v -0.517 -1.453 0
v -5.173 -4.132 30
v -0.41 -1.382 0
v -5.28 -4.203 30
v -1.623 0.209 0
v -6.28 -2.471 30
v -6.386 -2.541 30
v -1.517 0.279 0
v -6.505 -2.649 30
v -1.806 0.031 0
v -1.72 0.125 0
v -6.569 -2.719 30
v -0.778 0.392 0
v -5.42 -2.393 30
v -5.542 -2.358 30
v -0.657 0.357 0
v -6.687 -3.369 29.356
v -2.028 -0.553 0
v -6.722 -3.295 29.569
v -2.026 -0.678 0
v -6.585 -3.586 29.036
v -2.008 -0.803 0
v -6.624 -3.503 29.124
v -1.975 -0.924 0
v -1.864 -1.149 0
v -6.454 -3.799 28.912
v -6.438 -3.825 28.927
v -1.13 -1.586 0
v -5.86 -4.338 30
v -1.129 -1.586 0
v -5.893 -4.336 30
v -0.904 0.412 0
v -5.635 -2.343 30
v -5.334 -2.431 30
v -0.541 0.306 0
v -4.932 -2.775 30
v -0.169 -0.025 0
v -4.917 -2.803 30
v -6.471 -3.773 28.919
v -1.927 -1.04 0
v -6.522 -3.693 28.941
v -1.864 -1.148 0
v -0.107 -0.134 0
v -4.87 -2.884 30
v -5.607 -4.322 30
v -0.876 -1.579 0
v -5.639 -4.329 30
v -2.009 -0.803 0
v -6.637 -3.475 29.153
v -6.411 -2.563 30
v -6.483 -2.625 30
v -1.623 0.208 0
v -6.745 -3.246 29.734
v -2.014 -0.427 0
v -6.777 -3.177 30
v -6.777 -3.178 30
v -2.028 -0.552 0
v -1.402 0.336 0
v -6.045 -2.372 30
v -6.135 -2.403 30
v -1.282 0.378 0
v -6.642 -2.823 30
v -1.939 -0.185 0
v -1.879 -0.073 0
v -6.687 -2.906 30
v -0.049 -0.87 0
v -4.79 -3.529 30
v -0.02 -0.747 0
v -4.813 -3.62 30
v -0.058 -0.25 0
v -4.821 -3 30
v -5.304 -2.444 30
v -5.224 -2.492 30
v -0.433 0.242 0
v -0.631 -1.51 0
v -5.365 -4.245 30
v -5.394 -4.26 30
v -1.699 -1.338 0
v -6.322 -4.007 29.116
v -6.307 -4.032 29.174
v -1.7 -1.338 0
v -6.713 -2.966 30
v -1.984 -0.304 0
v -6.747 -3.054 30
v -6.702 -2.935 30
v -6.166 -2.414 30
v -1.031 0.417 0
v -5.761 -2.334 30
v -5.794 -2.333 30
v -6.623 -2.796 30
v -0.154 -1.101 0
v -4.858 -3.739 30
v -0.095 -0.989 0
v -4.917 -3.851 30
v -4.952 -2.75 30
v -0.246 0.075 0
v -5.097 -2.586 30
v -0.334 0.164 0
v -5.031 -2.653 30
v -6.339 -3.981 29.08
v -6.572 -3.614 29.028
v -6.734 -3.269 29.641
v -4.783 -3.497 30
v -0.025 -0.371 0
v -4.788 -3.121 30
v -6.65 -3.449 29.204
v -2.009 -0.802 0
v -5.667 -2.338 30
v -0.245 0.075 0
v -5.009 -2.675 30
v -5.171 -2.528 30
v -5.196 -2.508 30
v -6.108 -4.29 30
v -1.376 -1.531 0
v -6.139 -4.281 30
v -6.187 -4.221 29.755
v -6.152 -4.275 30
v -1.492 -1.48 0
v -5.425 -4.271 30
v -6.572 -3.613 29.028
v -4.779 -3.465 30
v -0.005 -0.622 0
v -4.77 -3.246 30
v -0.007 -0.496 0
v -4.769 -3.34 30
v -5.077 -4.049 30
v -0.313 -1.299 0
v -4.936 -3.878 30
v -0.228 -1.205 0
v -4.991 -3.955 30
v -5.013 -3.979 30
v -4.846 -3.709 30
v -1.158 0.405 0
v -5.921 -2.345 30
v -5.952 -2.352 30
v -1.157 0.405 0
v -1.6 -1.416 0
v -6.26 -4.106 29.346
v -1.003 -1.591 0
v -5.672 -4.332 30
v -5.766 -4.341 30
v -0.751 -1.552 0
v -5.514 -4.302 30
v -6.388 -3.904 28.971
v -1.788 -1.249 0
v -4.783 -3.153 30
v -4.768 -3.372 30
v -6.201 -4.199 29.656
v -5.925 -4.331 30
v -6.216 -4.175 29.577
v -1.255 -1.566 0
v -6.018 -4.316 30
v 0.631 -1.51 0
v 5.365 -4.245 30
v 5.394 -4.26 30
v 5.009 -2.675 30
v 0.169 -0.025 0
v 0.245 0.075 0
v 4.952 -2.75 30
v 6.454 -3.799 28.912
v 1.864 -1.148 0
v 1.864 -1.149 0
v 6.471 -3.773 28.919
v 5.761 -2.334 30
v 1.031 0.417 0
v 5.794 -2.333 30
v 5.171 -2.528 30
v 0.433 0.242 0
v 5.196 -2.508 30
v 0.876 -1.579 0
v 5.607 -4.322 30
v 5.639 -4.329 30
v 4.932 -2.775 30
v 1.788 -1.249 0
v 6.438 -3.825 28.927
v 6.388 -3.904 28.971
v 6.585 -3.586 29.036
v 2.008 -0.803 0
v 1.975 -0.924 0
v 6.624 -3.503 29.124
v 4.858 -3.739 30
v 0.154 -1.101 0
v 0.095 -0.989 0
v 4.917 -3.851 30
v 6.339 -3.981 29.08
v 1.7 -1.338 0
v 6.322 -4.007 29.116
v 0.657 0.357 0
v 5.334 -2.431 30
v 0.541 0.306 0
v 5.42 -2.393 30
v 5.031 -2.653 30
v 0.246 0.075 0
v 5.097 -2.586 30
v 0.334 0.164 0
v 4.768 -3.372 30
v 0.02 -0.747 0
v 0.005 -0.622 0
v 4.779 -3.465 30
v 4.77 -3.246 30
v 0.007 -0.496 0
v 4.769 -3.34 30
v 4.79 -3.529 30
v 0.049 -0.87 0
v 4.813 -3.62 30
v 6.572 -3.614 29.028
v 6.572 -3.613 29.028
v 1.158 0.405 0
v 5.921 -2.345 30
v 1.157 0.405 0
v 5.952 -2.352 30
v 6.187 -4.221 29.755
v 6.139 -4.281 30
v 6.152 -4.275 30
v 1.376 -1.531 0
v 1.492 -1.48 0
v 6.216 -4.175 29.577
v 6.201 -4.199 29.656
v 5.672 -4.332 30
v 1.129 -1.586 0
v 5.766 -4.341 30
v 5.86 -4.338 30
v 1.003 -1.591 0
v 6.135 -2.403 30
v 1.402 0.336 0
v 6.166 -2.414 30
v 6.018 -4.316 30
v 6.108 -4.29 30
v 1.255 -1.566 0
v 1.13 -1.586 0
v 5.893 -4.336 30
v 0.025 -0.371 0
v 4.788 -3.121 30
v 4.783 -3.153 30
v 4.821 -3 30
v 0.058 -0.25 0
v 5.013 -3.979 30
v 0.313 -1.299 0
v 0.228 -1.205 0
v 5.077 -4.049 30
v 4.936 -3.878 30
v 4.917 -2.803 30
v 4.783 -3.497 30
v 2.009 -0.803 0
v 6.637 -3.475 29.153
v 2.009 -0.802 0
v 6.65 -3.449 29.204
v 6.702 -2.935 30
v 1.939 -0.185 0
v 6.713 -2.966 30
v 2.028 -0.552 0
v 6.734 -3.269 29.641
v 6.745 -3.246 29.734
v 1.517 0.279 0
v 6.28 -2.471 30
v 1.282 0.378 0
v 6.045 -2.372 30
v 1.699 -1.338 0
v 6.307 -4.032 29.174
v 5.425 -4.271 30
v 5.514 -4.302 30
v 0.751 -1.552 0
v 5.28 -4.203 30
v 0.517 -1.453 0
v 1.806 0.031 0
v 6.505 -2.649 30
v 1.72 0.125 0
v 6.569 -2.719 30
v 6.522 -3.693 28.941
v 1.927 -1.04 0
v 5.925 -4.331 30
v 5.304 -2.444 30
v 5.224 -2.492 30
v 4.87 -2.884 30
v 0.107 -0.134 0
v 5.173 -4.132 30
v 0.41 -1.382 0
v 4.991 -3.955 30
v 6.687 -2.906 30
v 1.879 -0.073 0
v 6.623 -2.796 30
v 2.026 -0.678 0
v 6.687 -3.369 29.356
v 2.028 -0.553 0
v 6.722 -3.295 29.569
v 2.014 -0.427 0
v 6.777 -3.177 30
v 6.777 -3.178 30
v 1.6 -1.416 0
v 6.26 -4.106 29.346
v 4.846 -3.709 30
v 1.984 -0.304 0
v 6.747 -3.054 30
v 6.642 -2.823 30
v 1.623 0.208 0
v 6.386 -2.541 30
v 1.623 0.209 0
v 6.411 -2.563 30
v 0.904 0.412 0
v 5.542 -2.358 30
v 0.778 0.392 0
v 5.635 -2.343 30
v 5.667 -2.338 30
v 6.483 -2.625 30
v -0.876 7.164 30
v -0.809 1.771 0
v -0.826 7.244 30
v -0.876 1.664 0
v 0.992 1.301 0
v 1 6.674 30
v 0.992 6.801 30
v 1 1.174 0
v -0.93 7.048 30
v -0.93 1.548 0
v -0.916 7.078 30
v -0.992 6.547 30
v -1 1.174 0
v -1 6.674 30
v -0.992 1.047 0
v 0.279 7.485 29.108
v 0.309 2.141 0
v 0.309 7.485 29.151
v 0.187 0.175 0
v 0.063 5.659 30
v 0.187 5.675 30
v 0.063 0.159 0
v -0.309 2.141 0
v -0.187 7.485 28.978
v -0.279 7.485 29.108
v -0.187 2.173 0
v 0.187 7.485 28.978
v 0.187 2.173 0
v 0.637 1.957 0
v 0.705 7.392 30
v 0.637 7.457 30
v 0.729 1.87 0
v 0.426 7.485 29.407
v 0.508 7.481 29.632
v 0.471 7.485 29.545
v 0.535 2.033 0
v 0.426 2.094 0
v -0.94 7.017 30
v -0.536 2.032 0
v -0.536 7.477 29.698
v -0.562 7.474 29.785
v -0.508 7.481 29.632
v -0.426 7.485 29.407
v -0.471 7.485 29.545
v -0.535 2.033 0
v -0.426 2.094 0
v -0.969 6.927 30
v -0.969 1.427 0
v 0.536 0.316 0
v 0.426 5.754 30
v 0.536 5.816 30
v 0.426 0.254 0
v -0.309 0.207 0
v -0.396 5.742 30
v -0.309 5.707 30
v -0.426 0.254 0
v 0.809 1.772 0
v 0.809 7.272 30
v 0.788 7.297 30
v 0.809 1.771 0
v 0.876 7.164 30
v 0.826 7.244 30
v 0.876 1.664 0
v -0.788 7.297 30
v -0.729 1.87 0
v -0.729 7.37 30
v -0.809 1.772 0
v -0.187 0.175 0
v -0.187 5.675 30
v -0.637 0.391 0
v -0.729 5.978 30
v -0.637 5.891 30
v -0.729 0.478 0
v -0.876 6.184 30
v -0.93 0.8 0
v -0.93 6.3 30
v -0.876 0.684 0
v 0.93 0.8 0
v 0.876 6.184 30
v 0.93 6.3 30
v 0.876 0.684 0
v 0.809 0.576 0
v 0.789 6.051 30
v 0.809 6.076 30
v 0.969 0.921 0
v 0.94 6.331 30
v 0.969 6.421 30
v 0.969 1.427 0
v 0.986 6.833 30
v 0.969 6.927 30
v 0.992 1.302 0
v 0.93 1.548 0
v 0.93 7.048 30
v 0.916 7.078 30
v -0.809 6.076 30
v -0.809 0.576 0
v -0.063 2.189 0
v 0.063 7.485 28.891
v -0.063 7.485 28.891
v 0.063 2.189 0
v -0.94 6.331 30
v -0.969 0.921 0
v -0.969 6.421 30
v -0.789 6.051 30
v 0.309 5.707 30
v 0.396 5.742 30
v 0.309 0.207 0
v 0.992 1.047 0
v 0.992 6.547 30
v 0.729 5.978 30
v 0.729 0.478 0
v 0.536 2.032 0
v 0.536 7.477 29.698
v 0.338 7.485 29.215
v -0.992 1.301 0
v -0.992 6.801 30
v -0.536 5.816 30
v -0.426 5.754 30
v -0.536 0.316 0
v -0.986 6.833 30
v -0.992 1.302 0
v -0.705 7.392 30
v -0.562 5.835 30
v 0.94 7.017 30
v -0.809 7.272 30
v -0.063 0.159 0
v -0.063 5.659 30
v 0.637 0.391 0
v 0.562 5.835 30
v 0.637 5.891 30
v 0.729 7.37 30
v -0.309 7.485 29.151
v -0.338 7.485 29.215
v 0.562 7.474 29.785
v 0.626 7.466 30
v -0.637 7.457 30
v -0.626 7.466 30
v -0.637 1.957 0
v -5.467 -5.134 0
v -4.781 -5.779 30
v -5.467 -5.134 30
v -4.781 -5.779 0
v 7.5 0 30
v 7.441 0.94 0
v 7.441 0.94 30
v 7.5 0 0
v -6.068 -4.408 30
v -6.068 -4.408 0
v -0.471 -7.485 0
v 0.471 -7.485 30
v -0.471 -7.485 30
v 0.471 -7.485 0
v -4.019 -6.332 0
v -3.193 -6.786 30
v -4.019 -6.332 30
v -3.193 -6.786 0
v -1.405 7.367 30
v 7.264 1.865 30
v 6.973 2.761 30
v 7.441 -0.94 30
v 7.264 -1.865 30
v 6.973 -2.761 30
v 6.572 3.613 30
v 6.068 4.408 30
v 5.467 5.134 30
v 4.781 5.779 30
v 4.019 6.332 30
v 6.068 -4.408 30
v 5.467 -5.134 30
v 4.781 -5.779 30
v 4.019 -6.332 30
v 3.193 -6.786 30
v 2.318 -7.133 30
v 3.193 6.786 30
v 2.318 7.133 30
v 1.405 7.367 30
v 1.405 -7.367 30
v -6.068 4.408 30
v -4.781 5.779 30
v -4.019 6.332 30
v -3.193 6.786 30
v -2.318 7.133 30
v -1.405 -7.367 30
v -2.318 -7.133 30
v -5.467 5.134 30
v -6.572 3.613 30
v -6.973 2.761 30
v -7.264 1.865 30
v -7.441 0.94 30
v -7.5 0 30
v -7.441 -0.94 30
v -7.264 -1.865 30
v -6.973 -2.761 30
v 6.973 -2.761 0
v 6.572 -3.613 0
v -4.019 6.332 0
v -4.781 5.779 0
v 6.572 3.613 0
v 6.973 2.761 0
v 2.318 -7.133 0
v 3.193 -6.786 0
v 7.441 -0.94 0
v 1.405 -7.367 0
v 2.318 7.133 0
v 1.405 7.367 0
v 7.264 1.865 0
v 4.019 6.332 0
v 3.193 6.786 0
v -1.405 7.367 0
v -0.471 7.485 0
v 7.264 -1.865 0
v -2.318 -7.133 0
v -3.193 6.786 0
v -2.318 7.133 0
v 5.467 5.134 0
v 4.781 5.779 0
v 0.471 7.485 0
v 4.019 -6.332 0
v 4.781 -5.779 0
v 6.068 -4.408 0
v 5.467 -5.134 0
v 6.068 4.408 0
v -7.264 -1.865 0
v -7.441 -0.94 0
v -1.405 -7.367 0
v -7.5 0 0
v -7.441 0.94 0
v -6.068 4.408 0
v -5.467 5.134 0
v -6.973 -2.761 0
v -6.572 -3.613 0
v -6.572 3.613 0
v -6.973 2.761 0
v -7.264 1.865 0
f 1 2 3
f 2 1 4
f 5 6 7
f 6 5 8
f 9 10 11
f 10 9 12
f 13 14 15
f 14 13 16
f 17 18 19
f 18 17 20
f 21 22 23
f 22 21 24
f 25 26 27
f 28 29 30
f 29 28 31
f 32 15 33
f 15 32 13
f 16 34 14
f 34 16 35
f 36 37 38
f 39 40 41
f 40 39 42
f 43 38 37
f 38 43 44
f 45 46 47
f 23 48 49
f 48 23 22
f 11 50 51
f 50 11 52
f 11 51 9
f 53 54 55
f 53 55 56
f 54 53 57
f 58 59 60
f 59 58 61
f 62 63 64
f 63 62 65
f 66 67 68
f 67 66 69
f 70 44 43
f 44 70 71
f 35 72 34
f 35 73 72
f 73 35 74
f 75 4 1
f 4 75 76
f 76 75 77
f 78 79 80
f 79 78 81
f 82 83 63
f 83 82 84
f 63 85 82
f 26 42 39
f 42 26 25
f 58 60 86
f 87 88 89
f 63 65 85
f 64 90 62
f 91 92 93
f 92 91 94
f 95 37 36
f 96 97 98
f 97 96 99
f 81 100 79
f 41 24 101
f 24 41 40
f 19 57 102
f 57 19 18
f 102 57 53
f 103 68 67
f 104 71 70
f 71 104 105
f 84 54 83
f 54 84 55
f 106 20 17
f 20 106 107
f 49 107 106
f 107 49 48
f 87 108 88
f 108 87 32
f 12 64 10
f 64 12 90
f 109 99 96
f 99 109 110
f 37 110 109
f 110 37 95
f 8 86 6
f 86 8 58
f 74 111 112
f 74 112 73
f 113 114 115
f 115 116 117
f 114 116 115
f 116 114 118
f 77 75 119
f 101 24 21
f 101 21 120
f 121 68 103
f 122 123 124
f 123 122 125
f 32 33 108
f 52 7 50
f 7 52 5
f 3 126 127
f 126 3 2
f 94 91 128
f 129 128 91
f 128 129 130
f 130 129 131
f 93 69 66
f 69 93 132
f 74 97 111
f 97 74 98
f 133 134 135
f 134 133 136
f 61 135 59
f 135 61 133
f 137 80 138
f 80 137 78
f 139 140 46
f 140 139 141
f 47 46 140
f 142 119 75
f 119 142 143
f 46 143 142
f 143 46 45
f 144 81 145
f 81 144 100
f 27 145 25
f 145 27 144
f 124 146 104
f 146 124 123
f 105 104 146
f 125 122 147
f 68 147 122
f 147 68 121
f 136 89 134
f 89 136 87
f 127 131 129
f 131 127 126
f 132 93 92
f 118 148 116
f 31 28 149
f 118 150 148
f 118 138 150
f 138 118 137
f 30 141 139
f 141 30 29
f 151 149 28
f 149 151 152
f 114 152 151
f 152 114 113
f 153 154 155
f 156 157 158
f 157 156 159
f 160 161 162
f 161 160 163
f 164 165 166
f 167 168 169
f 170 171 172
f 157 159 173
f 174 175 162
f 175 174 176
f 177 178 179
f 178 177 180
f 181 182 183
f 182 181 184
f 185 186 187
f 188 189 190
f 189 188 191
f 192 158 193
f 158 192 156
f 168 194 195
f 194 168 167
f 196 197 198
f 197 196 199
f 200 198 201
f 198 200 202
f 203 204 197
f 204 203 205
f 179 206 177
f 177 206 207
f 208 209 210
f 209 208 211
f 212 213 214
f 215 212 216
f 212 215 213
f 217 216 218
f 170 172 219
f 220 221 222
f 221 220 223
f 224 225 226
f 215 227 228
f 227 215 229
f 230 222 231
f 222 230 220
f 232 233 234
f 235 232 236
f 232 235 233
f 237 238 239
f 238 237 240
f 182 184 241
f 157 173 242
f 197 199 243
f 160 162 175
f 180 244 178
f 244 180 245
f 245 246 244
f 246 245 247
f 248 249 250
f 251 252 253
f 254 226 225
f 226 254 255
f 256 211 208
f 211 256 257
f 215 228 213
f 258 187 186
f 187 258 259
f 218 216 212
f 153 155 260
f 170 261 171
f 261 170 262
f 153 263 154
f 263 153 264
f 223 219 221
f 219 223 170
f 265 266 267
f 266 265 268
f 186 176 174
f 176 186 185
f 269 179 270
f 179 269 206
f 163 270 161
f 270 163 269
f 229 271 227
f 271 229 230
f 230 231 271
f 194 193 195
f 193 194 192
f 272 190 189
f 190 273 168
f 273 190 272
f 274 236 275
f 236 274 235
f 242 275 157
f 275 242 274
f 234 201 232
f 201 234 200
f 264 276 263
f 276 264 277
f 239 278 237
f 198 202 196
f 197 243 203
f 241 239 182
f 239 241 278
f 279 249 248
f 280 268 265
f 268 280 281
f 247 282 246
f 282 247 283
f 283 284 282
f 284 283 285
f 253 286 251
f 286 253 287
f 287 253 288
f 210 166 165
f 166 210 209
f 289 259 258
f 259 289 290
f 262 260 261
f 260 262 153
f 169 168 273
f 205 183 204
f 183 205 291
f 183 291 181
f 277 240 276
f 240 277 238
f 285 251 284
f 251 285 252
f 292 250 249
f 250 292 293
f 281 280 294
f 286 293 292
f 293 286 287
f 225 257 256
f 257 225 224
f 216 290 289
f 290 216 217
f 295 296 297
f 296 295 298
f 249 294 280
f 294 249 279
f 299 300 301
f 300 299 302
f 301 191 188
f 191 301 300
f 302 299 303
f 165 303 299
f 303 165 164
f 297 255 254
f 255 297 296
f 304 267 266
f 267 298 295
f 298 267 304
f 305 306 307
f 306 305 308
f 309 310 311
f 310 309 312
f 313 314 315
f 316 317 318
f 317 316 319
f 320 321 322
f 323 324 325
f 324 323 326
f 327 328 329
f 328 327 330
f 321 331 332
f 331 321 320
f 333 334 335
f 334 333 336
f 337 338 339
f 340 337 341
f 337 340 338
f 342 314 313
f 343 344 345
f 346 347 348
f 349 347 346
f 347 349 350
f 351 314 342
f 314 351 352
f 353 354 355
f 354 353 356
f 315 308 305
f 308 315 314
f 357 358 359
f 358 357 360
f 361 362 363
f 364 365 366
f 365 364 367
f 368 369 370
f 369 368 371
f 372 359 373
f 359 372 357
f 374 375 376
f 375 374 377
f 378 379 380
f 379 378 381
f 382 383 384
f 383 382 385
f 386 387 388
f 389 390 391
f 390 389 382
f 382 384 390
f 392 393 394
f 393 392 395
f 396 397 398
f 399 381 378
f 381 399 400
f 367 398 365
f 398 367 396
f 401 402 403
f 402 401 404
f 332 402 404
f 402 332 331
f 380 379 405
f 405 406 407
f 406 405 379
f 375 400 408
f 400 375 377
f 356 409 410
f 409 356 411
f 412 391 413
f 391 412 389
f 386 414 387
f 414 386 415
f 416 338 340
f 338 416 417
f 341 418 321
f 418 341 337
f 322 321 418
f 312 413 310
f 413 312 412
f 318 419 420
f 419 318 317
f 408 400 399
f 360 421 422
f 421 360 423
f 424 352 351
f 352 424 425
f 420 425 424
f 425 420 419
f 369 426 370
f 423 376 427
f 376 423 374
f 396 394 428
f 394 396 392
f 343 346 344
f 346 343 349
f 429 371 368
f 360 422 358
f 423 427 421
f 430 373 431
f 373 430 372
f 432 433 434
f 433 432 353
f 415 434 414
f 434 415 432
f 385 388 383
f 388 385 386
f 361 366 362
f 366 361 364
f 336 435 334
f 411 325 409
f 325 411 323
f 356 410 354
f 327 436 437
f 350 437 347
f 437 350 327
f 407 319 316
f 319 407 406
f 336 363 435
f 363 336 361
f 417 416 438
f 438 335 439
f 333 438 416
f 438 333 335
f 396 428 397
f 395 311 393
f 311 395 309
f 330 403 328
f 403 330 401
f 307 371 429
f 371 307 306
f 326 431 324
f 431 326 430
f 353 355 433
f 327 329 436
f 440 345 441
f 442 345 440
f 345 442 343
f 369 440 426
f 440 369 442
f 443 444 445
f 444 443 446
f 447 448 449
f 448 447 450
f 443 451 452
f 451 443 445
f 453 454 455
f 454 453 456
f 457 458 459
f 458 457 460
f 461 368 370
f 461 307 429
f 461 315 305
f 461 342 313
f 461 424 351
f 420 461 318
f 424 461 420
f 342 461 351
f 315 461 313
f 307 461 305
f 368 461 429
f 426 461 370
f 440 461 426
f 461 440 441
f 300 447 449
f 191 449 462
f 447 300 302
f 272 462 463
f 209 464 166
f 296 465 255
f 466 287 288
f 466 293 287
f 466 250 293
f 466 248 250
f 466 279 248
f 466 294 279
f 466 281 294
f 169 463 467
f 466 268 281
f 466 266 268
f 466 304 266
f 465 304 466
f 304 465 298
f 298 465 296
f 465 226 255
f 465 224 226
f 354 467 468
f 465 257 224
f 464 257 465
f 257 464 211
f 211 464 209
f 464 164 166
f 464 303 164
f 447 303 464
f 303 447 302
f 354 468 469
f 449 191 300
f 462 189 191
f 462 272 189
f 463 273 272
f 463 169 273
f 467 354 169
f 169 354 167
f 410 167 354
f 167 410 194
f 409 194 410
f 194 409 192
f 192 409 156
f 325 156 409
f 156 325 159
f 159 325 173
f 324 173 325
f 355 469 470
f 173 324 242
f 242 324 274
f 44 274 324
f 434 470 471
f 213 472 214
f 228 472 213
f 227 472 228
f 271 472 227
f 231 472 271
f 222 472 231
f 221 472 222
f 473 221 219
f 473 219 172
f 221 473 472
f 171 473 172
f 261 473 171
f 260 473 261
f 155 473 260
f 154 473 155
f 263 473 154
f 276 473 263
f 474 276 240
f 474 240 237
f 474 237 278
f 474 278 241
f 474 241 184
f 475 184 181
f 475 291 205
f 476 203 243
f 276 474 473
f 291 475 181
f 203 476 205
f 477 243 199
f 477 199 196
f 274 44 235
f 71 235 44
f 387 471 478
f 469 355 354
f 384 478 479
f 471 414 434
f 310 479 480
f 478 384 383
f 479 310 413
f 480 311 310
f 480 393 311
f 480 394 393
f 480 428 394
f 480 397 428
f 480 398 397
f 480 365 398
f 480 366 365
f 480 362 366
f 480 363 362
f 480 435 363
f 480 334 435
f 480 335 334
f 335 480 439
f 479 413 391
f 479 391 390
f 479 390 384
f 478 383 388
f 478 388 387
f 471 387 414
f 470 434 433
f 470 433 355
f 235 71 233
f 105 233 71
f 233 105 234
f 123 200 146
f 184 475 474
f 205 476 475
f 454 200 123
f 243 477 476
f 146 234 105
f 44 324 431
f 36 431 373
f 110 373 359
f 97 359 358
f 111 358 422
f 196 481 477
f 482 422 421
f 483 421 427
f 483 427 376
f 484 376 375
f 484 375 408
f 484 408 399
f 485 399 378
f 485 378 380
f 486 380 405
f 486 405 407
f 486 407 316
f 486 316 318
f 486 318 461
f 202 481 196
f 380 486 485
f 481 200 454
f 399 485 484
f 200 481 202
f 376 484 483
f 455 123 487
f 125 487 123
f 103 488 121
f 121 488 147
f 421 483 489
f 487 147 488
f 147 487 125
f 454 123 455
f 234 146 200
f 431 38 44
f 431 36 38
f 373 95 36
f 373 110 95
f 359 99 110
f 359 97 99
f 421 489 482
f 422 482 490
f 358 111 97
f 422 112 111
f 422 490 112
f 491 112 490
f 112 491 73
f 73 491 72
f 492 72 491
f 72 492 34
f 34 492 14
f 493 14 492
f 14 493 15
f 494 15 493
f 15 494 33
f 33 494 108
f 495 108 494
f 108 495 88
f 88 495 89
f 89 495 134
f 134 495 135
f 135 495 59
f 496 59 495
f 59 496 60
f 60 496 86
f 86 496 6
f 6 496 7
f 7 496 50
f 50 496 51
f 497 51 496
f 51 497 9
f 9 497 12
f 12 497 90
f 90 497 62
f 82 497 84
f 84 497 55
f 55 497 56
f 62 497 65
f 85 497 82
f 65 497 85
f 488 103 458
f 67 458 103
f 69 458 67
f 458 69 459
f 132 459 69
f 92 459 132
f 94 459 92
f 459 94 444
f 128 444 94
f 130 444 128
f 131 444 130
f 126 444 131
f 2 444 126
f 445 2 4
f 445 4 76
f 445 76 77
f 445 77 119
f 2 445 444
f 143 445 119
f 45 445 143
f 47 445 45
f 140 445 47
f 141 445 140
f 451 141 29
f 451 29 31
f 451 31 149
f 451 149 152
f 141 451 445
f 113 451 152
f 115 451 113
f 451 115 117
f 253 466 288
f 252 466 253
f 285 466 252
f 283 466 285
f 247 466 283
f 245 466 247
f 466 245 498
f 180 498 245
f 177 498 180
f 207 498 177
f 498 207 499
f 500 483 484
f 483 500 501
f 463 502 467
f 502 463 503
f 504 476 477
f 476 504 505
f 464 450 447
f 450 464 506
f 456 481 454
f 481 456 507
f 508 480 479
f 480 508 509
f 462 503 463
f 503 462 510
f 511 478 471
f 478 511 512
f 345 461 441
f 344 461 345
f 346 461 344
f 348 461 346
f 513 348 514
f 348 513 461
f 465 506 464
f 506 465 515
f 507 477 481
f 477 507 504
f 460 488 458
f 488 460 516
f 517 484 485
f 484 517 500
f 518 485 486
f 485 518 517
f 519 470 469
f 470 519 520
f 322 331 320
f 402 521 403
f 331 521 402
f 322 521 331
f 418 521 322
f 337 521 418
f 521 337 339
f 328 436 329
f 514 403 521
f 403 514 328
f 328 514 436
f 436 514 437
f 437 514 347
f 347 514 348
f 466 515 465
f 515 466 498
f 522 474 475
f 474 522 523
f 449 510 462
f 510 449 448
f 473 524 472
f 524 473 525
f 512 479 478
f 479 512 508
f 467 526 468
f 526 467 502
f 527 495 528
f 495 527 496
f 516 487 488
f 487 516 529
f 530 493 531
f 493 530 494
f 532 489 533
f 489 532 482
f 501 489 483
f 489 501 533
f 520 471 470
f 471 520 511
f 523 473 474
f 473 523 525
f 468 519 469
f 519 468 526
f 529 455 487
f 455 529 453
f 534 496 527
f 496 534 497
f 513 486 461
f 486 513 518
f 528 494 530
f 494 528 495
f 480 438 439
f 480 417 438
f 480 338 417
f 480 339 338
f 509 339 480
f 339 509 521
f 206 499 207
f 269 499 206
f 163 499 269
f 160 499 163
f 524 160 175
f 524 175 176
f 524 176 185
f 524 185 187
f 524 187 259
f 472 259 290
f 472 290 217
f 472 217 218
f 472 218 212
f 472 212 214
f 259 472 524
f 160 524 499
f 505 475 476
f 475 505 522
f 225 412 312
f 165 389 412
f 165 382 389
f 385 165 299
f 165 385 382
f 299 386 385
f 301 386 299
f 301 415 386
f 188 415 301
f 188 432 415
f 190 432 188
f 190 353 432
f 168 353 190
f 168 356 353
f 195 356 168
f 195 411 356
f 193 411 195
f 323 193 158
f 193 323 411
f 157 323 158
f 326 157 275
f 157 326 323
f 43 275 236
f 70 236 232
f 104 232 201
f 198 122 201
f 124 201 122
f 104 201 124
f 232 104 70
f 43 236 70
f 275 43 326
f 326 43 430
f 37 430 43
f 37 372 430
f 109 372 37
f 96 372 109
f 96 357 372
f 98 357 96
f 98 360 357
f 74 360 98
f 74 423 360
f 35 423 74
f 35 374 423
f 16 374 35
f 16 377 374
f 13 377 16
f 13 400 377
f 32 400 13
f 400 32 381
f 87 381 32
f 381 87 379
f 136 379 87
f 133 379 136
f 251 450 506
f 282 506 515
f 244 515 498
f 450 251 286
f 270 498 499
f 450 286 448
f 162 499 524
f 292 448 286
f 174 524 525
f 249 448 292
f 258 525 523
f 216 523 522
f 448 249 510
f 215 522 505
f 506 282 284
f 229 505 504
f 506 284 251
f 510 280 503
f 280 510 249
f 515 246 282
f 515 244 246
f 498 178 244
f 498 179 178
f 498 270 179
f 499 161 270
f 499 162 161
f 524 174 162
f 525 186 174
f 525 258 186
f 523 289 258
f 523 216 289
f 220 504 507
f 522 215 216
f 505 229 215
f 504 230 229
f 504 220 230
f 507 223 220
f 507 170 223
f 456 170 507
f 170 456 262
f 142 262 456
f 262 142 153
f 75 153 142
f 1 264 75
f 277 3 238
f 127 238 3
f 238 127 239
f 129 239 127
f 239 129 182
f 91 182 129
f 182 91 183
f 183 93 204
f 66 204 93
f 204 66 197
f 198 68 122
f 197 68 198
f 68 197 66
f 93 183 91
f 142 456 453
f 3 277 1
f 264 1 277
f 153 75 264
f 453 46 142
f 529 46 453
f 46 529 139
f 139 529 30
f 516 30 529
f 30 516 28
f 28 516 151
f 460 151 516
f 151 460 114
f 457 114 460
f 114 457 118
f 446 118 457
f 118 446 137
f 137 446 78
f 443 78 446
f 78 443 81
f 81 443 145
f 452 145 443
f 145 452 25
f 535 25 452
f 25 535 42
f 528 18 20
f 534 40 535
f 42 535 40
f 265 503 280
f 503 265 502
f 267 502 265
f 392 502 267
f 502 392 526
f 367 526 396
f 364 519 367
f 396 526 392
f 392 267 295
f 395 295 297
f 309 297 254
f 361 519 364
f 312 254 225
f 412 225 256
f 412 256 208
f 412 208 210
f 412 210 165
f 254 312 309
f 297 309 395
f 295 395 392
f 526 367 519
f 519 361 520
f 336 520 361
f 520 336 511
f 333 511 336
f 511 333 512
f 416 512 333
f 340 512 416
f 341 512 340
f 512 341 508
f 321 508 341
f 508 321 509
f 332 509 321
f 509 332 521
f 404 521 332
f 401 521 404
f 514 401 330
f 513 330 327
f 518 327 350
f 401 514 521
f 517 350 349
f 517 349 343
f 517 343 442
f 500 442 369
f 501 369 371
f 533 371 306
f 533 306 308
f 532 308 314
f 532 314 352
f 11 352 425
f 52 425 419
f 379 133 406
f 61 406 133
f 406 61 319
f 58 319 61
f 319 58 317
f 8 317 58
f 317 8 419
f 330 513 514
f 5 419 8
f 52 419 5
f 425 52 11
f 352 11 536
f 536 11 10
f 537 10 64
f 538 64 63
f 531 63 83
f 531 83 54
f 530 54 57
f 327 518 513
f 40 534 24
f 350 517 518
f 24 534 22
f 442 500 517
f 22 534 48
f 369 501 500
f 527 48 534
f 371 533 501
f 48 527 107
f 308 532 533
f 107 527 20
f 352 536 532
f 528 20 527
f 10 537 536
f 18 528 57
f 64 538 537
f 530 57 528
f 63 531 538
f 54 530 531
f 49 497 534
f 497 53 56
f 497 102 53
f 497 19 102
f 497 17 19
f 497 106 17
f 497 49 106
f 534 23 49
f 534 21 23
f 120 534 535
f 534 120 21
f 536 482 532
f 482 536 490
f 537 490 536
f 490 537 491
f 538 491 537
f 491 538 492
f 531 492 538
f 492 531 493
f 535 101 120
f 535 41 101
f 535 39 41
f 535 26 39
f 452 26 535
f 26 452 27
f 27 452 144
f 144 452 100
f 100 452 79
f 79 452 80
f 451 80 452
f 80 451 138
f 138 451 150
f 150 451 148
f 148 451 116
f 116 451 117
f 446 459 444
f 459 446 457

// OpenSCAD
// preview[view:north, tilt:top]

center = 0; //[0:No Center, 1:Center]
wireRad = 1;
jigRad = 7.5;
jigHeight=30;
numStrand = 3; //[3:20]
// Smoothness of the stl
$fn=50;

difference()
{
	cylinder(h=jigHeight, r=jigRad);

	union()
	{
		for (i=[1:1:numStrand])
		{
			if (center)
			{
				rotate([-atan((jigRad-(wireRad/(sin(180/numStrand))+wireRad*(1-cos(180/numStrand))))/jigHeight),0,i*360/numStrand])
				translate([0,wireRad/(sin(180/numStrand))+wireRad*(1-cos(180/numStrand)),0])
				cylinder(h=jigHeight*4, r=wireRad, center=false);
			}
			else
			{
				rotate([-atan((jigRad-(wireRad/(cos(180/numStrand))))/jigHeight),0,i*360/numStrand])
				translate([0,wireRad/(sin(180/numStrand)),0])
				cylinder(h=jigHeight*4, r=wireRad, center=false);
			}
		}
		if (center)
		{
			cylinder(h=jigHeight*4, r=wireRad, center=true);
		}
	}
}
